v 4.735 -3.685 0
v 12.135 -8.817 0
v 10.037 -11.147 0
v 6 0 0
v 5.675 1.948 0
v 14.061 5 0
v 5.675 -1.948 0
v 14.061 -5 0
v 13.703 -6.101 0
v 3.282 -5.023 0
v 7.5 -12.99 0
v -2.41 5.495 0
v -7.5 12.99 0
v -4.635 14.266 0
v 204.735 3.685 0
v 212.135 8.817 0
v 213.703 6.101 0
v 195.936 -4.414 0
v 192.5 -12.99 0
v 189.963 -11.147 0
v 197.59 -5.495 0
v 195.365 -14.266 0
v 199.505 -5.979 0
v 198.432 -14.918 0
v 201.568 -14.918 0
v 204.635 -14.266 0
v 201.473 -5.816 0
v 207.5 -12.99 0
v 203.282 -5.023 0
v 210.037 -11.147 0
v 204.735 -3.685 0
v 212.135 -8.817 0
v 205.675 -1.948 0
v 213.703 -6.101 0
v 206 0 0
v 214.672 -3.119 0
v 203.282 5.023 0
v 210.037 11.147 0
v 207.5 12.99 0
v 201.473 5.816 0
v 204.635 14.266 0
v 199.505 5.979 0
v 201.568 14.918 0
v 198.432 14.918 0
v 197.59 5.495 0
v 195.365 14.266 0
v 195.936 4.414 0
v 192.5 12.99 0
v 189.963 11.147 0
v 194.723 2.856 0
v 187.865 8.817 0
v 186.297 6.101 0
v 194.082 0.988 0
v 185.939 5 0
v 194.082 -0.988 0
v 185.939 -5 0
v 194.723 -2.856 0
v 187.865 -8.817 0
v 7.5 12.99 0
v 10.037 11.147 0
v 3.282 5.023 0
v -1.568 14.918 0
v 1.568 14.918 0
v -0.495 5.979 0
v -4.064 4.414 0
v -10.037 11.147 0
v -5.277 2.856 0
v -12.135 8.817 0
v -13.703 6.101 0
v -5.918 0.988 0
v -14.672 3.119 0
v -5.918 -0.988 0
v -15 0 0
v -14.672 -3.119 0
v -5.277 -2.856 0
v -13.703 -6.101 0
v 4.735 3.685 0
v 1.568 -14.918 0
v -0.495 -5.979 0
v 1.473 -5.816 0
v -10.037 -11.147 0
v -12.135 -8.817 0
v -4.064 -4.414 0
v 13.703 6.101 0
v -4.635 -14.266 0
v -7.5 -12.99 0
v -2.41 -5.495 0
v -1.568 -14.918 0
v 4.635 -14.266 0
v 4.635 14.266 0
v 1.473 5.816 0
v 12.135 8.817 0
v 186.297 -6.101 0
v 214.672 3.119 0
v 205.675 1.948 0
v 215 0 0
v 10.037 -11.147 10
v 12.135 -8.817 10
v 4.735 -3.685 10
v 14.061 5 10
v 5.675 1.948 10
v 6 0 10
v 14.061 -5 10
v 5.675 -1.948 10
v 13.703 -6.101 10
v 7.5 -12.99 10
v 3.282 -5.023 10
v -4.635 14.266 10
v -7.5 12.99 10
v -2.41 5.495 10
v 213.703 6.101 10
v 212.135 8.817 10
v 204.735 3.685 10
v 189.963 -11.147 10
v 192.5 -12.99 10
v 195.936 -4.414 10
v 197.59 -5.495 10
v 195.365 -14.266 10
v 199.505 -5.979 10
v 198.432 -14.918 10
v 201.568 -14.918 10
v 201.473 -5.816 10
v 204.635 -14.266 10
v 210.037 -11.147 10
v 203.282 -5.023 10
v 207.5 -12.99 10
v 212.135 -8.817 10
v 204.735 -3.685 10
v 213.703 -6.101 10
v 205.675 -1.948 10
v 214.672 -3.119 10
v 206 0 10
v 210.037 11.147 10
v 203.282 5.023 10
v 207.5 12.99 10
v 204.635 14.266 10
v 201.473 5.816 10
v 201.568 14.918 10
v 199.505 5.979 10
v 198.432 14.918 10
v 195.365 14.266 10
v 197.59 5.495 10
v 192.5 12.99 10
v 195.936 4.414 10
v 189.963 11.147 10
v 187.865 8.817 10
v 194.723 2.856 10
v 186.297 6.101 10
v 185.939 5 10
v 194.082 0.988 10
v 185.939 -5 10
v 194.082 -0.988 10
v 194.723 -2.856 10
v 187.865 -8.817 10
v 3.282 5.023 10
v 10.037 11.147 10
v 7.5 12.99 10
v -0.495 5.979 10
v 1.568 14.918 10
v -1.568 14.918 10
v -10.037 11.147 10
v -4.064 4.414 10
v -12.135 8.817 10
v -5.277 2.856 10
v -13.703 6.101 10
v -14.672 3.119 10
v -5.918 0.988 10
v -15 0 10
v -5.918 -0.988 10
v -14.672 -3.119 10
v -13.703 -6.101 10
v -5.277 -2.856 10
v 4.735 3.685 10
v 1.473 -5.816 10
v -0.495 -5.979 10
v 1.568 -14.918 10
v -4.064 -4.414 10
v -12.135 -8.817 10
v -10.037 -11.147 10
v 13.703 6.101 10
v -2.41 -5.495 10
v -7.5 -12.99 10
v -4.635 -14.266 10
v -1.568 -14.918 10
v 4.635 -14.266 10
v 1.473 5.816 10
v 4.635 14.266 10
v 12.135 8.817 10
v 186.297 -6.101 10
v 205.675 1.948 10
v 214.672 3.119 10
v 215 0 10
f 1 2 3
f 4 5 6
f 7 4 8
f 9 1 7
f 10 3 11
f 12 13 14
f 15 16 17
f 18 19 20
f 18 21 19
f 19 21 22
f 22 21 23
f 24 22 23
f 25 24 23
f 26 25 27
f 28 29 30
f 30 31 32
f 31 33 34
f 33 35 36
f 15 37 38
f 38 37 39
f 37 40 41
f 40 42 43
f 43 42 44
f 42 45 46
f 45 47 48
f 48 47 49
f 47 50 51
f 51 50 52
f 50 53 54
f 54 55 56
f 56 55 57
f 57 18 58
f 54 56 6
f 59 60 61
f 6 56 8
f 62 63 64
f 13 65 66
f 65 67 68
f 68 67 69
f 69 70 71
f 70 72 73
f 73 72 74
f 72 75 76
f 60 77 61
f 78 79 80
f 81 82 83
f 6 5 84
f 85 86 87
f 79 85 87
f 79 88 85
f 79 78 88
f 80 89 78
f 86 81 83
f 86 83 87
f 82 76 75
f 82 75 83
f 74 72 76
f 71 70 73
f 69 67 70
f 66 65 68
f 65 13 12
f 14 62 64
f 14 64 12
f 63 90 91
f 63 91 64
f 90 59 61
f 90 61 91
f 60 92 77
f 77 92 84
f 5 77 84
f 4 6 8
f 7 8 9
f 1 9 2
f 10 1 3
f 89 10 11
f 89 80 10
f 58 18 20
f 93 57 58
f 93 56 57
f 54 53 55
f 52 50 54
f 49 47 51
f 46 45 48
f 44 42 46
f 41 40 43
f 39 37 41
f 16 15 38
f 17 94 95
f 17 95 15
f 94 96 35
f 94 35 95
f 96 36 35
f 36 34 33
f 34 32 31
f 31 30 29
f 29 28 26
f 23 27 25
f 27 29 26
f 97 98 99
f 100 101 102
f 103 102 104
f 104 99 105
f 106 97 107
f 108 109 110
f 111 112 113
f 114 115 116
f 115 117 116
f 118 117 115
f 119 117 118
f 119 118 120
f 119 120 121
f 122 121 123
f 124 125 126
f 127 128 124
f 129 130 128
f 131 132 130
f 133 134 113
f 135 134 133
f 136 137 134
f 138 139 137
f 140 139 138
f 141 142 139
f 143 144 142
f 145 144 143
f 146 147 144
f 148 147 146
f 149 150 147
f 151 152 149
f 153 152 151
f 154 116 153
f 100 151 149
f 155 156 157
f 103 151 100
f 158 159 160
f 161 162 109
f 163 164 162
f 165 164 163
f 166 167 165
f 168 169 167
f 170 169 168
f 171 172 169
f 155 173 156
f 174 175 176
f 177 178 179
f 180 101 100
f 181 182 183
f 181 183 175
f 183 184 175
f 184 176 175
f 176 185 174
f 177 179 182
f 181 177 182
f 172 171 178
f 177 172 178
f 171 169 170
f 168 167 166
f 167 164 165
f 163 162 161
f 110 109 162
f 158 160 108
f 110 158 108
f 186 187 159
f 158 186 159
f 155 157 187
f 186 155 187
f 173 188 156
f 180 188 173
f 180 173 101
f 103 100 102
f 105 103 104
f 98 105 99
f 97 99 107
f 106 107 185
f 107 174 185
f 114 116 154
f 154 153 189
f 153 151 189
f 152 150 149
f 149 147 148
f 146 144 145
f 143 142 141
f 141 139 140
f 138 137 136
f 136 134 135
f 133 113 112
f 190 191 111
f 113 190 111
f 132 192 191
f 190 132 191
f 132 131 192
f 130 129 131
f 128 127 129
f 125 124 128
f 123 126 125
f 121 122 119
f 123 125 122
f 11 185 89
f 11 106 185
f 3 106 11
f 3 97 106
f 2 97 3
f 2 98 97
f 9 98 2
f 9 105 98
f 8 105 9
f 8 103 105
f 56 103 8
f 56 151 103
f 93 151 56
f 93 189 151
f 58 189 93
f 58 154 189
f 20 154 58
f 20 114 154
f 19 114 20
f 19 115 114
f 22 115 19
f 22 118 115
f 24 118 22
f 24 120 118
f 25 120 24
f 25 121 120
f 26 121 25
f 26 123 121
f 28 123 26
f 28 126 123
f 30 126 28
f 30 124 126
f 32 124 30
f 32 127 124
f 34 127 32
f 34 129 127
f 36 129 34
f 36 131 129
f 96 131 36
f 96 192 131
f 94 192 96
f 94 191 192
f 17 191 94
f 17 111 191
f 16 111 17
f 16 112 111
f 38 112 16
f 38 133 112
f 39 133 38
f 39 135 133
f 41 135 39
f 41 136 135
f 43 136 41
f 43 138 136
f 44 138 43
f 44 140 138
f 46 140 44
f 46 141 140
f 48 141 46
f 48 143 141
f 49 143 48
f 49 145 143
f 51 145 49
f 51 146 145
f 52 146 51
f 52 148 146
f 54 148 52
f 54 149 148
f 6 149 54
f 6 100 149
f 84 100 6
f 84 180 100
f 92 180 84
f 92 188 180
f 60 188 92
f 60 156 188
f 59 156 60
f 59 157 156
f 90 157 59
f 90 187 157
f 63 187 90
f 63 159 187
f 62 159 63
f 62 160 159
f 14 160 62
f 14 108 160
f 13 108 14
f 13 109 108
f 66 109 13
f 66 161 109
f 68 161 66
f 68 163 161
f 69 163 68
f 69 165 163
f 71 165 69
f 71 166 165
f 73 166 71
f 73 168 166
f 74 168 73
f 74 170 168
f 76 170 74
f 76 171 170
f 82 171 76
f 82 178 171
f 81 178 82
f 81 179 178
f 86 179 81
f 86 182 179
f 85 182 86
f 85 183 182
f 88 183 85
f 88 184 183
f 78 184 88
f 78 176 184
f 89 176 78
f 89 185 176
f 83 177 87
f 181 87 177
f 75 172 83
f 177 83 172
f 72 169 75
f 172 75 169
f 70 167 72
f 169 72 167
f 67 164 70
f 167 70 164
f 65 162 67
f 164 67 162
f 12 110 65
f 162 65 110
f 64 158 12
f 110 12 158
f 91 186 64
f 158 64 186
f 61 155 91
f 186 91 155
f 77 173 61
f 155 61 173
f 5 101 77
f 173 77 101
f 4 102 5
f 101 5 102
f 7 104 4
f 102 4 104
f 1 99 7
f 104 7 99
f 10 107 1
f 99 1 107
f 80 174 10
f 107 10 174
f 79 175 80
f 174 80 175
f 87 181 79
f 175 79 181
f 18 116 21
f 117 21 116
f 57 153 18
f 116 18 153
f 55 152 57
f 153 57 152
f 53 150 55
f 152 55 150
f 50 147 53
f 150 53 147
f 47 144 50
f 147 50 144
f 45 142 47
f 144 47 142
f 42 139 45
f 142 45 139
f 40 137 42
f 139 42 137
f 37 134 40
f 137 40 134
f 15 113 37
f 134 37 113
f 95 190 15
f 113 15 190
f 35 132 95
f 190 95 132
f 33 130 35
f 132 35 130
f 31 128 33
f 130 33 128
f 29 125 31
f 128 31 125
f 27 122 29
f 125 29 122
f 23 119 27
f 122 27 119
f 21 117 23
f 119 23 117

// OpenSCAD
module washer(r= 20,b = 6){
        difference(){
        circle(r);
        circle(b);
    }

}

module pin(x = 150,j = 15){
    linear_extrude(10){    
    washer(j);
    translate([x,0,0])
    washer(j);
    y = 10;
    translate([j/2,-y/2,0])
    square([x - j ,y]);
    }
}

module link(b = 50, l = 100){
    
    // AABB

    // A 
pin(l);
translate([0,b,0])
pin(l);

// B
translate([0,0,13])
{
rotate([0,0,90])
pin(b);
translate([l,0,0])
rotate([0,0,90])
pin(b);
}





}
pin(200);

//link(100,50);

//translate([0,100,12])
//link(100,50);


module gripper_base(){
    translate([-150,0,-130])
    color("green"){


        // translate([-20,20,30])
        // rotate([0,-60,0])
        // cylinder(h = 100,r=6);
        // translate([-100,20,90])
        // rotate([0,60,0])
        // cylinder(h = 100,r=6);
        translate([-0,0,50])
        rotate([0,-60,0])
        cylinder(h = 100,r=6);
        translate([-100,-10,110])
        rotate([0,60,0])
        cylinder(h = 100,r=6);
        translate([-0,-0,30])
        rotate([0,-60,0])
        cylinder(h = 100,r=6);
        translate([-100,-10,90])
        rotate([0,60,0])
        cylinder(h = 100,r=6);

            
        translate([10,0,50]){
            translate([-10,0,0])
            cylinder(h = 60,r=10,center=true);
            cube([10,80,80],center=true);
        }
    }
}




module lift_plate(){
    
    cylinder(h=40,r=20);

    intersection(){

    cube([300,300,10],center=true);
    rotate([0,0,45])
    cube([300,300,10],center=true);
    }
    
    
    gripper_base();
    
    
    
}


// lift_plate();
